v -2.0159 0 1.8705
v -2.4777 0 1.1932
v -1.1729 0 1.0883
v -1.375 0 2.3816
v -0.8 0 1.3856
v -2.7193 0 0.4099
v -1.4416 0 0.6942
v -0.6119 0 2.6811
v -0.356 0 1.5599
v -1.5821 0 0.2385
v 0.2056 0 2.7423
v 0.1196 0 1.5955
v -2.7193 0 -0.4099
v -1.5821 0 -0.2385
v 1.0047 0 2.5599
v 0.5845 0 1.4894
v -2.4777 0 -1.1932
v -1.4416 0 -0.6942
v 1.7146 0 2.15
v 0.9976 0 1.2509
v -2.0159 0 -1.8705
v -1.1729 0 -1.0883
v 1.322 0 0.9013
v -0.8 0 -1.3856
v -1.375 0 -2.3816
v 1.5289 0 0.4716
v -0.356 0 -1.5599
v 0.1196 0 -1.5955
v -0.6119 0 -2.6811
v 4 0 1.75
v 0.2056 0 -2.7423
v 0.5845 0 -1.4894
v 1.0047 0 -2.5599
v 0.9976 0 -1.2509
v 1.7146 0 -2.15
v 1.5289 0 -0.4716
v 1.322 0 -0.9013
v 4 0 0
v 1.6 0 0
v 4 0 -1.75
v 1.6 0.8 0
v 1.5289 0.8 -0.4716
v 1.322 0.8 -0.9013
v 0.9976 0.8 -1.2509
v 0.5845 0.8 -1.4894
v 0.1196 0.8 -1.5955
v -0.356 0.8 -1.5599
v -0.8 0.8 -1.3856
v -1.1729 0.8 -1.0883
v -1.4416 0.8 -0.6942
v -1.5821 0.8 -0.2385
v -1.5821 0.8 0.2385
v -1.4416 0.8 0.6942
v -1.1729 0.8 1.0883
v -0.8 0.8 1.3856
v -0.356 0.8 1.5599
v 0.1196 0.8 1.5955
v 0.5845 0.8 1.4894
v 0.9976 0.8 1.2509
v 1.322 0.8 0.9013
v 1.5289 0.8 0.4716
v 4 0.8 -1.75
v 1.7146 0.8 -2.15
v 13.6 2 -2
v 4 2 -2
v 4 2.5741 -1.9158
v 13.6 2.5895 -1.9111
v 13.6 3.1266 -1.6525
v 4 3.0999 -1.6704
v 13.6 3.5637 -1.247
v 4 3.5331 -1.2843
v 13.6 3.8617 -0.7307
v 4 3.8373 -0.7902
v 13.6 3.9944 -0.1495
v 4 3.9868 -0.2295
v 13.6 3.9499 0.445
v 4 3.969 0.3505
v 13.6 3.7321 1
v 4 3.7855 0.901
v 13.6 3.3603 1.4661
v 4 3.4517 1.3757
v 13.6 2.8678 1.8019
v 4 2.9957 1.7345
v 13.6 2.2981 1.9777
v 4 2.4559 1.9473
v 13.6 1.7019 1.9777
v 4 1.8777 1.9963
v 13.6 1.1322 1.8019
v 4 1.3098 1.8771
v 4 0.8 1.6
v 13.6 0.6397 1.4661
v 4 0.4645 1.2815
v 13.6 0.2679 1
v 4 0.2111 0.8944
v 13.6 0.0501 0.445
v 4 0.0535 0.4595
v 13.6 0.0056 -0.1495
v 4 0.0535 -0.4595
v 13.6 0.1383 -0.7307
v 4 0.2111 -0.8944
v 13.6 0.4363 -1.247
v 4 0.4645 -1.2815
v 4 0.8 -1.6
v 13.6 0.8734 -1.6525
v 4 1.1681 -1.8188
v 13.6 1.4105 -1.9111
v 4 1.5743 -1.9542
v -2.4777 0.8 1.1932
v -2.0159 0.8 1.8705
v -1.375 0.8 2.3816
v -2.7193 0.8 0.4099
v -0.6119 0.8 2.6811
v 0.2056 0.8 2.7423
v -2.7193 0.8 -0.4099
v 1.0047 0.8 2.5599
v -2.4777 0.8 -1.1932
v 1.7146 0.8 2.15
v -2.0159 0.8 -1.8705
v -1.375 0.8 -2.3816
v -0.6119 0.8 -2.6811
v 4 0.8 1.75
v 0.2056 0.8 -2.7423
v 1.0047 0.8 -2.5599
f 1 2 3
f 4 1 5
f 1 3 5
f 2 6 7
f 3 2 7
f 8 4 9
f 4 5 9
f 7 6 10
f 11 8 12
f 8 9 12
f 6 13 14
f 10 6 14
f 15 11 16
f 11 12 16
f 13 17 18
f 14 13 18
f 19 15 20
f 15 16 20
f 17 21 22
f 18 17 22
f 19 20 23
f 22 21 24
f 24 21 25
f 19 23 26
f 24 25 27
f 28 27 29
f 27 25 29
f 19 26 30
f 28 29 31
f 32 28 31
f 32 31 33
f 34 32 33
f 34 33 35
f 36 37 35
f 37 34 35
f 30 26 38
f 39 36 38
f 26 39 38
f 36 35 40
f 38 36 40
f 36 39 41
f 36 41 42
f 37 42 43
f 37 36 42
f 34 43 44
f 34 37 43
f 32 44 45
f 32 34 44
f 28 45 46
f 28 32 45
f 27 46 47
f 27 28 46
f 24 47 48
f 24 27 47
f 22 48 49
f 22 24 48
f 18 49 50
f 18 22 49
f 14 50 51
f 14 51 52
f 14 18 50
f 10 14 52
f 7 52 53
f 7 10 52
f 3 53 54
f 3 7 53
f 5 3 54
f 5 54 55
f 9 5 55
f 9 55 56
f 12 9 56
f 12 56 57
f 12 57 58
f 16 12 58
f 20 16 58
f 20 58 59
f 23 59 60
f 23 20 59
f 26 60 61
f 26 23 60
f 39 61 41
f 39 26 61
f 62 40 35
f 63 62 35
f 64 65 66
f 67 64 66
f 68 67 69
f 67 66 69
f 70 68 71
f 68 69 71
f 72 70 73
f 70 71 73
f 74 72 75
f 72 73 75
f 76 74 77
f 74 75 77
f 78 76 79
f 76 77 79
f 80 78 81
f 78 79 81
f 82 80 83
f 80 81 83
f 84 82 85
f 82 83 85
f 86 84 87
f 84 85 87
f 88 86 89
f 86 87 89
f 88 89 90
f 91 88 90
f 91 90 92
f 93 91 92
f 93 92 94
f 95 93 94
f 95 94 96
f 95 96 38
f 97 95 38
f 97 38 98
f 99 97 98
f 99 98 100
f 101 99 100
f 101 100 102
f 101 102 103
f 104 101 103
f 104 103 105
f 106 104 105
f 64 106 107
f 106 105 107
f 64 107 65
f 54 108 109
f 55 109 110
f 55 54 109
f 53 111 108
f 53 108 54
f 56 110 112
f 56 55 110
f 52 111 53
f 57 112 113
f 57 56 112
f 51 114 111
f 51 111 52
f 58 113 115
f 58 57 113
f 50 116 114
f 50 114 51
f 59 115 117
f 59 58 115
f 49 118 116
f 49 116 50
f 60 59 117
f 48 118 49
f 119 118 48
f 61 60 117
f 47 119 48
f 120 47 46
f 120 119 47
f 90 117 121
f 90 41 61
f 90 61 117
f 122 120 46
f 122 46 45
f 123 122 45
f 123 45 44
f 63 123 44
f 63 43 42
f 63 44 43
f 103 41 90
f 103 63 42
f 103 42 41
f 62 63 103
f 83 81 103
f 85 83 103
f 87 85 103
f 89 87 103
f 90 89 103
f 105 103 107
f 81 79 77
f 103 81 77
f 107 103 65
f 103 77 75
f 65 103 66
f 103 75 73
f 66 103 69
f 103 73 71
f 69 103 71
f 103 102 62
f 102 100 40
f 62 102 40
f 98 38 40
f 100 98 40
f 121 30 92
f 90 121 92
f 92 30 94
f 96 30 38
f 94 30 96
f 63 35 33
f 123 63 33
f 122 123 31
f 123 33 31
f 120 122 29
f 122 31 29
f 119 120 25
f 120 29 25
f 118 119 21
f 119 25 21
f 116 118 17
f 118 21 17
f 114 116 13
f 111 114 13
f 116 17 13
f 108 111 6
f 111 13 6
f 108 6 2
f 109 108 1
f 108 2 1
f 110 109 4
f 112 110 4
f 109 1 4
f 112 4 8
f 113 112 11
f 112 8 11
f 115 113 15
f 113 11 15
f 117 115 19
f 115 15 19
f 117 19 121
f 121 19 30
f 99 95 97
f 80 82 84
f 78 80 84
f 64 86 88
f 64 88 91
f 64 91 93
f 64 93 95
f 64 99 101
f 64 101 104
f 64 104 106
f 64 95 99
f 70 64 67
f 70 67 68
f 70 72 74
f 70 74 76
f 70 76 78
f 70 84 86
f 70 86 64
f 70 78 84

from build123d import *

# Parameters (mm, degrees)
SKETCH1_R           = 1.6
BOSS_EXTRUDE1_DEPTH = 0.8
SKETCH2_R           = 2
BOSS_EXTRUDE2_DEPTH = 9.6


with BuildPart() as part:
    # Sketch1 → Boss-Extrude1 (new body)
    with BuildSketch(Plane(origin=(0, 0, 0), x_dir=(1, 0, 0), z_dir=(0, 1, 0))):
        with BuildLine():
            Line((4, -1.75), (4, 1.75))
            Line((4, 1.75), (1.71464282, 2.15))
            ThreePointArc((1.71464282, 2.15), (-2.75, 0), (1.71464282, -2.15))
            Line((1.71464282, -2.15), (4, -1.75))
        make_face()
        Circle(SKETCH1_R, mode=Mode.SUBTRACT)
    extrude(amount=BOSS_EXTRUDE1_DEPTH)

    # Sketch2 → Boss-Extrude2 (add)
    with BuildSketch(Plane(origin=(4, 0, 0), x_dir=(0, 0, -1), z_dir=(1, 0, 0))):
        with Locations((0, 2)):
            Circle(SKETCH2_R)
    extrude(amount=BOSS_EXTRUDE2_DEPTH)


solid = part.part
